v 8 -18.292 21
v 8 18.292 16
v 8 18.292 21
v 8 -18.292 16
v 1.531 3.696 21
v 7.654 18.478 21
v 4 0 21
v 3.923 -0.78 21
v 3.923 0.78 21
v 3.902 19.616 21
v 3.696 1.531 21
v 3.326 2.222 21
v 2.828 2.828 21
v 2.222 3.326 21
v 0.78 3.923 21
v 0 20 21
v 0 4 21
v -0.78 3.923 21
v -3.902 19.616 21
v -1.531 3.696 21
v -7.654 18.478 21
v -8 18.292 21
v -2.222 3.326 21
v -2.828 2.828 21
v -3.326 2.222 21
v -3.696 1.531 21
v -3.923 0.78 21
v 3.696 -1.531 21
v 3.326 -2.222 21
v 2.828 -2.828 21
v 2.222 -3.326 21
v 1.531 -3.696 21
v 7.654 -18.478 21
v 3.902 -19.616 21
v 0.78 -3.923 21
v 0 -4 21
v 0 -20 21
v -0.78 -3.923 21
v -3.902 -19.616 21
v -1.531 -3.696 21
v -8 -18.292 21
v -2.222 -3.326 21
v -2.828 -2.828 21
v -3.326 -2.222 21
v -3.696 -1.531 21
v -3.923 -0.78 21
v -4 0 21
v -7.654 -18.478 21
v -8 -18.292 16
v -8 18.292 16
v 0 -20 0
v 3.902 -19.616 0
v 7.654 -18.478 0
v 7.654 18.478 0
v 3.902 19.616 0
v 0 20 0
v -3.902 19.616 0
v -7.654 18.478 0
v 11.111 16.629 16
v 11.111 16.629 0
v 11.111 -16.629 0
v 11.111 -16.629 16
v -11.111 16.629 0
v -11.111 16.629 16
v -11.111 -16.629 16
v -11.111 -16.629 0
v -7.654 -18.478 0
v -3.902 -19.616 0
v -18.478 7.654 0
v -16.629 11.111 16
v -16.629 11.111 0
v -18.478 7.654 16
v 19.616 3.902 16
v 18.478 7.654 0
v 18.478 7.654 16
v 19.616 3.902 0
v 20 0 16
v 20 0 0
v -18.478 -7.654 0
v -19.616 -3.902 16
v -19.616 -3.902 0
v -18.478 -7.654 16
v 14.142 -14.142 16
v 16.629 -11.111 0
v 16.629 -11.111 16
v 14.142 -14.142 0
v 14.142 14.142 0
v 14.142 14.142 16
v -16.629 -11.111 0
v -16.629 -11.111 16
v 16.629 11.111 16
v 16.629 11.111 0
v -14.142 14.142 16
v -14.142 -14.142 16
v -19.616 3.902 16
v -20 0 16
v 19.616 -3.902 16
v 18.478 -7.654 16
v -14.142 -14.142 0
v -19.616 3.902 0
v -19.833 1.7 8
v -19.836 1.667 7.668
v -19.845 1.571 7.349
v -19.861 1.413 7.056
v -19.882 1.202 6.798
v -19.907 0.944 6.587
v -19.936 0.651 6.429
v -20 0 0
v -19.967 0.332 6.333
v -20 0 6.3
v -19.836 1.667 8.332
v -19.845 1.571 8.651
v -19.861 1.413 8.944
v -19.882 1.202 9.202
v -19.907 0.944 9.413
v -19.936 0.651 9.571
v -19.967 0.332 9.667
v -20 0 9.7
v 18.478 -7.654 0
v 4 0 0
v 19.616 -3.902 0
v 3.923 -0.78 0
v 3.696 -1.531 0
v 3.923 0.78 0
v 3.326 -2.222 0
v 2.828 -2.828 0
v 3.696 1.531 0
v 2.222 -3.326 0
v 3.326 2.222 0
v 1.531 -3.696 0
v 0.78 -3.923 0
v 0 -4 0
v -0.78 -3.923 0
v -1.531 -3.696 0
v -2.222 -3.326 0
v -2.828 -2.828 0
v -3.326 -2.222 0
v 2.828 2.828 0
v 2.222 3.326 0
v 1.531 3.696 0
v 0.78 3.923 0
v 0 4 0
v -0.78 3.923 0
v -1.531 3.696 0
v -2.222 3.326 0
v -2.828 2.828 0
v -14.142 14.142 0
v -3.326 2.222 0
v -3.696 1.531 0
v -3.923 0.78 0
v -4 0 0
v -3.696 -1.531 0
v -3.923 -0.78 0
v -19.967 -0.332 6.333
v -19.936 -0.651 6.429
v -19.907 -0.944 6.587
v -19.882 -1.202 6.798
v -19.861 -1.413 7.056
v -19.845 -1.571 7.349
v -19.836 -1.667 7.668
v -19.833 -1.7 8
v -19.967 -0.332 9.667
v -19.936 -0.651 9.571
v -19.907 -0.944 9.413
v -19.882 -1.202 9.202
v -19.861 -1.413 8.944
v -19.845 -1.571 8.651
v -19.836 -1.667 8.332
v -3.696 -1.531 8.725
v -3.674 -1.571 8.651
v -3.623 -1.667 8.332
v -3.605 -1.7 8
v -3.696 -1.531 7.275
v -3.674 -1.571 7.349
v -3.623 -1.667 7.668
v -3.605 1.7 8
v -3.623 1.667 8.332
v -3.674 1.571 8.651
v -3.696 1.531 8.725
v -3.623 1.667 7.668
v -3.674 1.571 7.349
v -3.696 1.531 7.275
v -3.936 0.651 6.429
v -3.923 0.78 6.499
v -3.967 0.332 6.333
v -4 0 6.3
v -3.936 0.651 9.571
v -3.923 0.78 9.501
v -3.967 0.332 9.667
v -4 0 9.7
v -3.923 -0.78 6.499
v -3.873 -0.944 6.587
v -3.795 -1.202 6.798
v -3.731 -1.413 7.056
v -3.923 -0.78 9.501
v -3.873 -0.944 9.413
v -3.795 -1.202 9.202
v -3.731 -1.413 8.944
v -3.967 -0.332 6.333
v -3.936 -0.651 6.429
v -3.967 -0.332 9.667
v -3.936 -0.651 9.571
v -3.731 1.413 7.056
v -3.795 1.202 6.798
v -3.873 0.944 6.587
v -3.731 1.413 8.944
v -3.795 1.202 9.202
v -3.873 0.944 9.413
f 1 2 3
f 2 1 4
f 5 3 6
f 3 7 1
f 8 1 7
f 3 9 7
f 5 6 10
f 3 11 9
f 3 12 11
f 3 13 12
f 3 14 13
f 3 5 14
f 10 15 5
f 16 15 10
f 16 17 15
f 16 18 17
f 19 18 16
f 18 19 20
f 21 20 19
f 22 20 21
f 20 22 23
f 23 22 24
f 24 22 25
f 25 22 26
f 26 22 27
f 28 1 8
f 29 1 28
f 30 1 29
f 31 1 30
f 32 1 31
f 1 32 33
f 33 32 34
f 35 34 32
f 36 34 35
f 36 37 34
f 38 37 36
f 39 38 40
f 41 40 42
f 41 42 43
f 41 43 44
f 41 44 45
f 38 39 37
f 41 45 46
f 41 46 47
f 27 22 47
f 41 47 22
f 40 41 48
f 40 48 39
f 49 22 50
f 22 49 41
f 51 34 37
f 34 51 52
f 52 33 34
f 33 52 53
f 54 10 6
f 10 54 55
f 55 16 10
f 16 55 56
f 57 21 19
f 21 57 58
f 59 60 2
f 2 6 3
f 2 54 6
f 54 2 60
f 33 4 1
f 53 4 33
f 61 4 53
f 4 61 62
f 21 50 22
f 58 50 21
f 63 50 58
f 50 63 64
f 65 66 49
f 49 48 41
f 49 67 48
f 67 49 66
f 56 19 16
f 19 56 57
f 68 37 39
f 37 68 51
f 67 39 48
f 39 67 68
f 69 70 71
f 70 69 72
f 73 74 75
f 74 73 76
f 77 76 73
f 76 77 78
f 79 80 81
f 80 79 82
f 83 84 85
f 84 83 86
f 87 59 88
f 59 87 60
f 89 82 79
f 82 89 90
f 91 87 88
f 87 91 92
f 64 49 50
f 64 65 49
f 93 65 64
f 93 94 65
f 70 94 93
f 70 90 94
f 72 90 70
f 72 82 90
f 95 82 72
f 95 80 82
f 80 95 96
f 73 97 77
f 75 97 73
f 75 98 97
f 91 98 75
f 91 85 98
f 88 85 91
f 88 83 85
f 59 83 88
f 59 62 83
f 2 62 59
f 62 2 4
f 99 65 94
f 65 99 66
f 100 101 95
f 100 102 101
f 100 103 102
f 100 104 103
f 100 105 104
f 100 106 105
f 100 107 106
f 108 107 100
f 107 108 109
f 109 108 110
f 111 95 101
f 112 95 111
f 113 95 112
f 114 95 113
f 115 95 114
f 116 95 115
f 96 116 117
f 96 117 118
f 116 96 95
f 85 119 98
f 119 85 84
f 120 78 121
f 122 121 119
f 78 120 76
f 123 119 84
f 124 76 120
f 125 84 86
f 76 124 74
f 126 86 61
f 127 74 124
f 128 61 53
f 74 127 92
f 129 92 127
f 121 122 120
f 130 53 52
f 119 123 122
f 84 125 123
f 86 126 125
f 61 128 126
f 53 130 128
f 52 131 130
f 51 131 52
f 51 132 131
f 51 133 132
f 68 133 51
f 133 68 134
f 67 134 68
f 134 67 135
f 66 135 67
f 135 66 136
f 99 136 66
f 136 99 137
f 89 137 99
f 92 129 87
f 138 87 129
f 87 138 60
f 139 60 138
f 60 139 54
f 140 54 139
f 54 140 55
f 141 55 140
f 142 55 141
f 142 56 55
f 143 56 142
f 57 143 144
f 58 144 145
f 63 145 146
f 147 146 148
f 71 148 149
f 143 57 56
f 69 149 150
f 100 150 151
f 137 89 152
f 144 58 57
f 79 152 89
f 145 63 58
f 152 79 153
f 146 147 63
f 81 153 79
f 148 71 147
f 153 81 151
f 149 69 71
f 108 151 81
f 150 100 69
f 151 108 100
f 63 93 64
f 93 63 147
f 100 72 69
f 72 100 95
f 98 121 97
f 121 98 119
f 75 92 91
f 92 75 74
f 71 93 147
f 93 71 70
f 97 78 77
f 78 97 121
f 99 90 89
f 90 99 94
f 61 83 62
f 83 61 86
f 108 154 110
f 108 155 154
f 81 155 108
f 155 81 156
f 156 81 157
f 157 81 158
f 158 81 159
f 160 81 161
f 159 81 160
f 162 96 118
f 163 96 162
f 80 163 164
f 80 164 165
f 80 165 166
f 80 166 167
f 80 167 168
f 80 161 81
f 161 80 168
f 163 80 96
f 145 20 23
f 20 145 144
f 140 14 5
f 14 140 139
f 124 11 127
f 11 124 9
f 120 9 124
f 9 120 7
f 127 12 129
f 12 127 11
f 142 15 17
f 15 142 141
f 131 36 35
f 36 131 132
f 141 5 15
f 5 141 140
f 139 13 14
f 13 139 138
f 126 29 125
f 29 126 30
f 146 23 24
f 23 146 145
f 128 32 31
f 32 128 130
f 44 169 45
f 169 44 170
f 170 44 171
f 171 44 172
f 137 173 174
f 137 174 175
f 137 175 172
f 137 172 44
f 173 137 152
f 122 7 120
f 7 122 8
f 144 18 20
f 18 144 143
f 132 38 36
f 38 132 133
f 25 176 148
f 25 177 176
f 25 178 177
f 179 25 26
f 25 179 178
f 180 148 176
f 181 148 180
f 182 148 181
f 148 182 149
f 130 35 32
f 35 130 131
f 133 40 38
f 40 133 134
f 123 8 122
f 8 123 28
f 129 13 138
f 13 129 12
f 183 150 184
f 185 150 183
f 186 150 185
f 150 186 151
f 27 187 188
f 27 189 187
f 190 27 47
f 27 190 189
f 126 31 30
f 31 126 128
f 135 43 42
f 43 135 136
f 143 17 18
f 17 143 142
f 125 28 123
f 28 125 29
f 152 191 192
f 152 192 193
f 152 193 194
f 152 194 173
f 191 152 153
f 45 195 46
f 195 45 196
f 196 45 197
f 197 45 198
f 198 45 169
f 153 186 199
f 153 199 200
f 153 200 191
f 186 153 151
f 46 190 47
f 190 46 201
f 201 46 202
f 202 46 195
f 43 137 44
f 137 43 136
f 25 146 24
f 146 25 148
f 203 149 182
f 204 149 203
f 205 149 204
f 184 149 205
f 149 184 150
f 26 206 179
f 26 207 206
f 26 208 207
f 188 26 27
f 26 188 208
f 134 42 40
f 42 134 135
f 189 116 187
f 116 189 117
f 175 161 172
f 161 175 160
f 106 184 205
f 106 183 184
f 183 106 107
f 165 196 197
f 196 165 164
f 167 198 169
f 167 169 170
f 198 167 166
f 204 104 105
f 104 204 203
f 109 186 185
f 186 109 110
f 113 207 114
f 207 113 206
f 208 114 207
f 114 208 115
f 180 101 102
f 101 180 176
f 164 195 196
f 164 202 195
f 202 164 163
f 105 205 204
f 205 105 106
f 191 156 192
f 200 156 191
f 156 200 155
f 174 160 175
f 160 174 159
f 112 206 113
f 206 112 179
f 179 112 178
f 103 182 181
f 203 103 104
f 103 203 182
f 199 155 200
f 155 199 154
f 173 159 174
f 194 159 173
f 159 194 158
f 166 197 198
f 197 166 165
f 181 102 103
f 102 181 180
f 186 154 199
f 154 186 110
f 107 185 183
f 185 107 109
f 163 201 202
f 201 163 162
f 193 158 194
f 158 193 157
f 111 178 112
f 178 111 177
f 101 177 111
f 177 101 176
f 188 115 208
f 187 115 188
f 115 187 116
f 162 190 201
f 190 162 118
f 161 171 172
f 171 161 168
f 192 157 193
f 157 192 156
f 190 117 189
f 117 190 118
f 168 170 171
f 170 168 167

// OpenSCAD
$fn = 32;

// ----------------------------------------------------------------------
// Oldham coupling hub: 40 x 21 mm
// ----------------------------------------------------------------------

// --- parameters (mm) ---
flange_dia = 40;          // hub diameter
flange_len = 16;          // hub length
hub_bore = 8;             // shaft bore
key_w = 16;               // drive tongue width
tongue_h = 5;             // drive tongue height
set_d = 3.4;              // set screw tap hole

module hub() {
  cylinder(h = flange_len, d = flange_dia);
  /* tongue, clipped to the hub disc and sunk 1 mm into the face */
  intersection() {
    translate([-key_w / 2, -flange_dia / 2, flange_len - 1])
      cube([key_w, flange_dia, tongue_h + 1]);
    translate([0, 0, flange_len - 1]) cylinder(h = tongue_h + 1, d = flange_dia);
  }
}

difference() {
  hub();
  translate([0, 0, -1]) cylinder(h = flange_len + tongue_h + 2, d = hub_bore);
  translate([-flange_dia / 2 - 1, 0, flange_len * 0.5])
    rotate([0, 90, 0]) cylinder(h = flange_dia / 2 + 2, d = set_d);
}
